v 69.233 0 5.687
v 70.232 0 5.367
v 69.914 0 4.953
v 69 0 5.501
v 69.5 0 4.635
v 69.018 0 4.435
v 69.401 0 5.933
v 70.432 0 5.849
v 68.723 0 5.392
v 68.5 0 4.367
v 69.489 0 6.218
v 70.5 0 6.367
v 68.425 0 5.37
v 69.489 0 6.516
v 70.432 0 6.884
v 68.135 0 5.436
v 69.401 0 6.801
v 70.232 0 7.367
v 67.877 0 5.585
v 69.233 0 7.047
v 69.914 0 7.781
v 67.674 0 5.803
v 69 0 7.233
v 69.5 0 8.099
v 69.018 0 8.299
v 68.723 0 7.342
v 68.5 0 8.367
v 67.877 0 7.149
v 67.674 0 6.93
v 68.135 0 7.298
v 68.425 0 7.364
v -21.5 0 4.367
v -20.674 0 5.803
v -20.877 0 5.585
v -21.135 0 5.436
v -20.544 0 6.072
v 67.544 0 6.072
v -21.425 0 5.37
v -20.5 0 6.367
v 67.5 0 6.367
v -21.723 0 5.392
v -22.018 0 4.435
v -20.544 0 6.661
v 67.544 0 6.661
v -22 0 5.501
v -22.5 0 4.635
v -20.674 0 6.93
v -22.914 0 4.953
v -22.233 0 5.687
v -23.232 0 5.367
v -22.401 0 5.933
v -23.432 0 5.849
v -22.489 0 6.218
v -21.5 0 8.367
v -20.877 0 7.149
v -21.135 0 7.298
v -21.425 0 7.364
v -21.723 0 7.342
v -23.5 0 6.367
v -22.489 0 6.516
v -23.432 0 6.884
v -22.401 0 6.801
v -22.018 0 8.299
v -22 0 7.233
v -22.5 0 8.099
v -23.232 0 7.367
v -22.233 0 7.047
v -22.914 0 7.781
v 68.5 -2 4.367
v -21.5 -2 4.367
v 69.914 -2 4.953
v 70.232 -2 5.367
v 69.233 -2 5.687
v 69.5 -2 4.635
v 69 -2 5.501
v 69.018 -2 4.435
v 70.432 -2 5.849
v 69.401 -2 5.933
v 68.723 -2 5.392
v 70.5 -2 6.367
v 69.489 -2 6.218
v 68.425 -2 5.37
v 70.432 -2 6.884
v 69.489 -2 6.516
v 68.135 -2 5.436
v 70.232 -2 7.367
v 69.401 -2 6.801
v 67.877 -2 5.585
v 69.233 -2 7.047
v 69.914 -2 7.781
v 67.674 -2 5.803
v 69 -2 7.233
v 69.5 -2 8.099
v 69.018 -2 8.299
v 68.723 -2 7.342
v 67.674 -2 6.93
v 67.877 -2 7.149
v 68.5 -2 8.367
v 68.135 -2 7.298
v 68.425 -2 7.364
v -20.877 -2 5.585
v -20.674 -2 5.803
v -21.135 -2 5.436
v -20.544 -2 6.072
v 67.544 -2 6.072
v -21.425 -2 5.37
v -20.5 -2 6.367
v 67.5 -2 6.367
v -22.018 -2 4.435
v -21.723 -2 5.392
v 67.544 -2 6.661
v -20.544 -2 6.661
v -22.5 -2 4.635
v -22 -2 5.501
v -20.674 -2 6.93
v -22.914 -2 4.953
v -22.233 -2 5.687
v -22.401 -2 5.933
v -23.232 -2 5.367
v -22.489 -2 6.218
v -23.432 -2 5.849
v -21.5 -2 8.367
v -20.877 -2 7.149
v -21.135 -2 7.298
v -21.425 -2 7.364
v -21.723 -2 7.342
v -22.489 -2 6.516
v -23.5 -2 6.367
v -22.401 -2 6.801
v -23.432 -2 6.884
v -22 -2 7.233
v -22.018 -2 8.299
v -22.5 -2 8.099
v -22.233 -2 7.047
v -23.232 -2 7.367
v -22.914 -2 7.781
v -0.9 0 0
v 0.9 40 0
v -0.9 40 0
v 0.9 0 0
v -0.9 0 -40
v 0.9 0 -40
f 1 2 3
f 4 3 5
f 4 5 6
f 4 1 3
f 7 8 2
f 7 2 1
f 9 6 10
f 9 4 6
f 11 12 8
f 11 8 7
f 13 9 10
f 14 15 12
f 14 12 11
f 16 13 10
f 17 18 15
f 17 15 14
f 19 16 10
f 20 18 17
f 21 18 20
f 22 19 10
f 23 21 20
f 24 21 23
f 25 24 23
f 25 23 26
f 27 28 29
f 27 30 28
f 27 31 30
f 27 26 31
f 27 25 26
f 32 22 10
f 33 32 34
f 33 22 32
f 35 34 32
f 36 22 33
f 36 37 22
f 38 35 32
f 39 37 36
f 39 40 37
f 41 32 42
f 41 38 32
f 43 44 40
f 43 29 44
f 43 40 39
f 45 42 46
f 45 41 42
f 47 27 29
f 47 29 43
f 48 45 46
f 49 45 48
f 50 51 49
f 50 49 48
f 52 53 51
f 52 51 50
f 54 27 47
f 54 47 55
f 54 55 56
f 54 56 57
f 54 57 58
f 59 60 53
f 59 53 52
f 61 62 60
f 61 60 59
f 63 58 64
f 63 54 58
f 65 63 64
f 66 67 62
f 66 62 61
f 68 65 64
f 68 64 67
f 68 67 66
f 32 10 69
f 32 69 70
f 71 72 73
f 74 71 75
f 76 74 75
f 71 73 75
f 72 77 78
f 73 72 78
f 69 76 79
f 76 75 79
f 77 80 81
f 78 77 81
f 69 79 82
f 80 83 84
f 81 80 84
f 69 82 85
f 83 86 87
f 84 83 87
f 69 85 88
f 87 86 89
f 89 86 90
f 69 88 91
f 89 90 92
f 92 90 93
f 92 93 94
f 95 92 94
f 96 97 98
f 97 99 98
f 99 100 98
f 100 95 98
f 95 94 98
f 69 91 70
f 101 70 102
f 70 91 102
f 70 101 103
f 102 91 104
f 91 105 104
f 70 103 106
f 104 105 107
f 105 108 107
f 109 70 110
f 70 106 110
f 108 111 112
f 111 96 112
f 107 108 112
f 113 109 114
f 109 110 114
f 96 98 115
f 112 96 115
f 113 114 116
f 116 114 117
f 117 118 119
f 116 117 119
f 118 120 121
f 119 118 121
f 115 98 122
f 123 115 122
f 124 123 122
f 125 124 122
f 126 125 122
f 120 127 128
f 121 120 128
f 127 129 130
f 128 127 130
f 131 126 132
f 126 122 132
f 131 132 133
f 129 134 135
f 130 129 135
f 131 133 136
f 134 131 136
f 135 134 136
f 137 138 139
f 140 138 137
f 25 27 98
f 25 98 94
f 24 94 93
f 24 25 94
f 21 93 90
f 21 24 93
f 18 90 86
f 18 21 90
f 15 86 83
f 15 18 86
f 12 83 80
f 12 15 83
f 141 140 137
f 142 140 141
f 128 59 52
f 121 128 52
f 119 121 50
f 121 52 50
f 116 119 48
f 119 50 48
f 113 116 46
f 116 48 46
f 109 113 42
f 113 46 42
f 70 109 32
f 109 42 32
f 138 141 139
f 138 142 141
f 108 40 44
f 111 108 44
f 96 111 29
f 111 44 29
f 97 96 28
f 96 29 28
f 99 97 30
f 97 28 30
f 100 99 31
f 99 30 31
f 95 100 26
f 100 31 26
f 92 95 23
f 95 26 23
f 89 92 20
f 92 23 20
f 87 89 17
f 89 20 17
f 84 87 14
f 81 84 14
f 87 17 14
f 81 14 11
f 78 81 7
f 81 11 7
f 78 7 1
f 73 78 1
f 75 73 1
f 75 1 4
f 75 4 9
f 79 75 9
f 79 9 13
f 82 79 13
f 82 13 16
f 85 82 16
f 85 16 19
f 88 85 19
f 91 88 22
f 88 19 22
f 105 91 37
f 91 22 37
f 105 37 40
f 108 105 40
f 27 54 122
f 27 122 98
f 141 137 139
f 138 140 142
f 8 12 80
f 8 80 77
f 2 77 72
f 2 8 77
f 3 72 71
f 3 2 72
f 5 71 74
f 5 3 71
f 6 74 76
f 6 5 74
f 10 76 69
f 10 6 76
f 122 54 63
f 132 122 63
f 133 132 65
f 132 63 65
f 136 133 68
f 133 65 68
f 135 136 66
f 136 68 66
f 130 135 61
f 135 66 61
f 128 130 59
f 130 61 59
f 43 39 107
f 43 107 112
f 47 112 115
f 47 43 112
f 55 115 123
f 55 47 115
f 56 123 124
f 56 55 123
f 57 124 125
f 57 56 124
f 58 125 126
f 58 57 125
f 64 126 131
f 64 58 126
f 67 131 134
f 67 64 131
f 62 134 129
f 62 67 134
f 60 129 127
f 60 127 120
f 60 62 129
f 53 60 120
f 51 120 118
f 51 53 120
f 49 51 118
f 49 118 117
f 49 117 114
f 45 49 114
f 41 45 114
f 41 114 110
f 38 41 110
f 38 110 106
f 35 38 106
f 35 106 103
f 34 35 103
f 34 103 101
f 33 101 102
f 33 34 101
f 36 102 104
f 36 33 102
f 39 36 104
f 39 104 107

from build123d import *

# Parameters (mm, degrees)
F1_DEPTH = 0.9
F2_R     = 1
F3_DEPTH = 2


with BuildPart() as f1:
    # F0 (on Right) → F1 (new body, symmetric)
    with BuildSketch(Plane.YZ):
        Polygon((40, 0), (0, 0), (0, -40), align=None)
    extrude(amount=F1_DEPTH, both=True)


with BuildPart() as f3:
    # F2 (on Front) → F3 (new body)
    with BuildSketch(Plane.XZ):
        with BuildLine():
            Line((23.5, 4.366741), (23.5, 8.366741))
            Line((23.5, 8.366741), (-21.5, 8.366741))
            ThreePointArc((-21.5, 8.366741), (-22.914214, 7.780955), (-23.5, 6.366741))
            ThreePointArc((-23.5, 6.366741), (-22.914214, 4.952528), (-21.5, 4.366741))
            Line((-21.5, 4.366741), (23.5, 4.366741))
        make_face()
        with Locations((-21.5, 6.366741)):
            Circle(F2_R, mode=Mode.SUBTRACT)
    extrude(amount=F3_DEPTH)

    # F4: F3 across face


with BuildPart() as f3_1:
    add(f3.part)
    add(f3.part.mirror(Plane(origin=(23.5, -1, 6.366741), x_dir=(0, 1, 0), z_dir=(1, 0, 0))))


solid = Compound([f1.part, f3_1.part])
